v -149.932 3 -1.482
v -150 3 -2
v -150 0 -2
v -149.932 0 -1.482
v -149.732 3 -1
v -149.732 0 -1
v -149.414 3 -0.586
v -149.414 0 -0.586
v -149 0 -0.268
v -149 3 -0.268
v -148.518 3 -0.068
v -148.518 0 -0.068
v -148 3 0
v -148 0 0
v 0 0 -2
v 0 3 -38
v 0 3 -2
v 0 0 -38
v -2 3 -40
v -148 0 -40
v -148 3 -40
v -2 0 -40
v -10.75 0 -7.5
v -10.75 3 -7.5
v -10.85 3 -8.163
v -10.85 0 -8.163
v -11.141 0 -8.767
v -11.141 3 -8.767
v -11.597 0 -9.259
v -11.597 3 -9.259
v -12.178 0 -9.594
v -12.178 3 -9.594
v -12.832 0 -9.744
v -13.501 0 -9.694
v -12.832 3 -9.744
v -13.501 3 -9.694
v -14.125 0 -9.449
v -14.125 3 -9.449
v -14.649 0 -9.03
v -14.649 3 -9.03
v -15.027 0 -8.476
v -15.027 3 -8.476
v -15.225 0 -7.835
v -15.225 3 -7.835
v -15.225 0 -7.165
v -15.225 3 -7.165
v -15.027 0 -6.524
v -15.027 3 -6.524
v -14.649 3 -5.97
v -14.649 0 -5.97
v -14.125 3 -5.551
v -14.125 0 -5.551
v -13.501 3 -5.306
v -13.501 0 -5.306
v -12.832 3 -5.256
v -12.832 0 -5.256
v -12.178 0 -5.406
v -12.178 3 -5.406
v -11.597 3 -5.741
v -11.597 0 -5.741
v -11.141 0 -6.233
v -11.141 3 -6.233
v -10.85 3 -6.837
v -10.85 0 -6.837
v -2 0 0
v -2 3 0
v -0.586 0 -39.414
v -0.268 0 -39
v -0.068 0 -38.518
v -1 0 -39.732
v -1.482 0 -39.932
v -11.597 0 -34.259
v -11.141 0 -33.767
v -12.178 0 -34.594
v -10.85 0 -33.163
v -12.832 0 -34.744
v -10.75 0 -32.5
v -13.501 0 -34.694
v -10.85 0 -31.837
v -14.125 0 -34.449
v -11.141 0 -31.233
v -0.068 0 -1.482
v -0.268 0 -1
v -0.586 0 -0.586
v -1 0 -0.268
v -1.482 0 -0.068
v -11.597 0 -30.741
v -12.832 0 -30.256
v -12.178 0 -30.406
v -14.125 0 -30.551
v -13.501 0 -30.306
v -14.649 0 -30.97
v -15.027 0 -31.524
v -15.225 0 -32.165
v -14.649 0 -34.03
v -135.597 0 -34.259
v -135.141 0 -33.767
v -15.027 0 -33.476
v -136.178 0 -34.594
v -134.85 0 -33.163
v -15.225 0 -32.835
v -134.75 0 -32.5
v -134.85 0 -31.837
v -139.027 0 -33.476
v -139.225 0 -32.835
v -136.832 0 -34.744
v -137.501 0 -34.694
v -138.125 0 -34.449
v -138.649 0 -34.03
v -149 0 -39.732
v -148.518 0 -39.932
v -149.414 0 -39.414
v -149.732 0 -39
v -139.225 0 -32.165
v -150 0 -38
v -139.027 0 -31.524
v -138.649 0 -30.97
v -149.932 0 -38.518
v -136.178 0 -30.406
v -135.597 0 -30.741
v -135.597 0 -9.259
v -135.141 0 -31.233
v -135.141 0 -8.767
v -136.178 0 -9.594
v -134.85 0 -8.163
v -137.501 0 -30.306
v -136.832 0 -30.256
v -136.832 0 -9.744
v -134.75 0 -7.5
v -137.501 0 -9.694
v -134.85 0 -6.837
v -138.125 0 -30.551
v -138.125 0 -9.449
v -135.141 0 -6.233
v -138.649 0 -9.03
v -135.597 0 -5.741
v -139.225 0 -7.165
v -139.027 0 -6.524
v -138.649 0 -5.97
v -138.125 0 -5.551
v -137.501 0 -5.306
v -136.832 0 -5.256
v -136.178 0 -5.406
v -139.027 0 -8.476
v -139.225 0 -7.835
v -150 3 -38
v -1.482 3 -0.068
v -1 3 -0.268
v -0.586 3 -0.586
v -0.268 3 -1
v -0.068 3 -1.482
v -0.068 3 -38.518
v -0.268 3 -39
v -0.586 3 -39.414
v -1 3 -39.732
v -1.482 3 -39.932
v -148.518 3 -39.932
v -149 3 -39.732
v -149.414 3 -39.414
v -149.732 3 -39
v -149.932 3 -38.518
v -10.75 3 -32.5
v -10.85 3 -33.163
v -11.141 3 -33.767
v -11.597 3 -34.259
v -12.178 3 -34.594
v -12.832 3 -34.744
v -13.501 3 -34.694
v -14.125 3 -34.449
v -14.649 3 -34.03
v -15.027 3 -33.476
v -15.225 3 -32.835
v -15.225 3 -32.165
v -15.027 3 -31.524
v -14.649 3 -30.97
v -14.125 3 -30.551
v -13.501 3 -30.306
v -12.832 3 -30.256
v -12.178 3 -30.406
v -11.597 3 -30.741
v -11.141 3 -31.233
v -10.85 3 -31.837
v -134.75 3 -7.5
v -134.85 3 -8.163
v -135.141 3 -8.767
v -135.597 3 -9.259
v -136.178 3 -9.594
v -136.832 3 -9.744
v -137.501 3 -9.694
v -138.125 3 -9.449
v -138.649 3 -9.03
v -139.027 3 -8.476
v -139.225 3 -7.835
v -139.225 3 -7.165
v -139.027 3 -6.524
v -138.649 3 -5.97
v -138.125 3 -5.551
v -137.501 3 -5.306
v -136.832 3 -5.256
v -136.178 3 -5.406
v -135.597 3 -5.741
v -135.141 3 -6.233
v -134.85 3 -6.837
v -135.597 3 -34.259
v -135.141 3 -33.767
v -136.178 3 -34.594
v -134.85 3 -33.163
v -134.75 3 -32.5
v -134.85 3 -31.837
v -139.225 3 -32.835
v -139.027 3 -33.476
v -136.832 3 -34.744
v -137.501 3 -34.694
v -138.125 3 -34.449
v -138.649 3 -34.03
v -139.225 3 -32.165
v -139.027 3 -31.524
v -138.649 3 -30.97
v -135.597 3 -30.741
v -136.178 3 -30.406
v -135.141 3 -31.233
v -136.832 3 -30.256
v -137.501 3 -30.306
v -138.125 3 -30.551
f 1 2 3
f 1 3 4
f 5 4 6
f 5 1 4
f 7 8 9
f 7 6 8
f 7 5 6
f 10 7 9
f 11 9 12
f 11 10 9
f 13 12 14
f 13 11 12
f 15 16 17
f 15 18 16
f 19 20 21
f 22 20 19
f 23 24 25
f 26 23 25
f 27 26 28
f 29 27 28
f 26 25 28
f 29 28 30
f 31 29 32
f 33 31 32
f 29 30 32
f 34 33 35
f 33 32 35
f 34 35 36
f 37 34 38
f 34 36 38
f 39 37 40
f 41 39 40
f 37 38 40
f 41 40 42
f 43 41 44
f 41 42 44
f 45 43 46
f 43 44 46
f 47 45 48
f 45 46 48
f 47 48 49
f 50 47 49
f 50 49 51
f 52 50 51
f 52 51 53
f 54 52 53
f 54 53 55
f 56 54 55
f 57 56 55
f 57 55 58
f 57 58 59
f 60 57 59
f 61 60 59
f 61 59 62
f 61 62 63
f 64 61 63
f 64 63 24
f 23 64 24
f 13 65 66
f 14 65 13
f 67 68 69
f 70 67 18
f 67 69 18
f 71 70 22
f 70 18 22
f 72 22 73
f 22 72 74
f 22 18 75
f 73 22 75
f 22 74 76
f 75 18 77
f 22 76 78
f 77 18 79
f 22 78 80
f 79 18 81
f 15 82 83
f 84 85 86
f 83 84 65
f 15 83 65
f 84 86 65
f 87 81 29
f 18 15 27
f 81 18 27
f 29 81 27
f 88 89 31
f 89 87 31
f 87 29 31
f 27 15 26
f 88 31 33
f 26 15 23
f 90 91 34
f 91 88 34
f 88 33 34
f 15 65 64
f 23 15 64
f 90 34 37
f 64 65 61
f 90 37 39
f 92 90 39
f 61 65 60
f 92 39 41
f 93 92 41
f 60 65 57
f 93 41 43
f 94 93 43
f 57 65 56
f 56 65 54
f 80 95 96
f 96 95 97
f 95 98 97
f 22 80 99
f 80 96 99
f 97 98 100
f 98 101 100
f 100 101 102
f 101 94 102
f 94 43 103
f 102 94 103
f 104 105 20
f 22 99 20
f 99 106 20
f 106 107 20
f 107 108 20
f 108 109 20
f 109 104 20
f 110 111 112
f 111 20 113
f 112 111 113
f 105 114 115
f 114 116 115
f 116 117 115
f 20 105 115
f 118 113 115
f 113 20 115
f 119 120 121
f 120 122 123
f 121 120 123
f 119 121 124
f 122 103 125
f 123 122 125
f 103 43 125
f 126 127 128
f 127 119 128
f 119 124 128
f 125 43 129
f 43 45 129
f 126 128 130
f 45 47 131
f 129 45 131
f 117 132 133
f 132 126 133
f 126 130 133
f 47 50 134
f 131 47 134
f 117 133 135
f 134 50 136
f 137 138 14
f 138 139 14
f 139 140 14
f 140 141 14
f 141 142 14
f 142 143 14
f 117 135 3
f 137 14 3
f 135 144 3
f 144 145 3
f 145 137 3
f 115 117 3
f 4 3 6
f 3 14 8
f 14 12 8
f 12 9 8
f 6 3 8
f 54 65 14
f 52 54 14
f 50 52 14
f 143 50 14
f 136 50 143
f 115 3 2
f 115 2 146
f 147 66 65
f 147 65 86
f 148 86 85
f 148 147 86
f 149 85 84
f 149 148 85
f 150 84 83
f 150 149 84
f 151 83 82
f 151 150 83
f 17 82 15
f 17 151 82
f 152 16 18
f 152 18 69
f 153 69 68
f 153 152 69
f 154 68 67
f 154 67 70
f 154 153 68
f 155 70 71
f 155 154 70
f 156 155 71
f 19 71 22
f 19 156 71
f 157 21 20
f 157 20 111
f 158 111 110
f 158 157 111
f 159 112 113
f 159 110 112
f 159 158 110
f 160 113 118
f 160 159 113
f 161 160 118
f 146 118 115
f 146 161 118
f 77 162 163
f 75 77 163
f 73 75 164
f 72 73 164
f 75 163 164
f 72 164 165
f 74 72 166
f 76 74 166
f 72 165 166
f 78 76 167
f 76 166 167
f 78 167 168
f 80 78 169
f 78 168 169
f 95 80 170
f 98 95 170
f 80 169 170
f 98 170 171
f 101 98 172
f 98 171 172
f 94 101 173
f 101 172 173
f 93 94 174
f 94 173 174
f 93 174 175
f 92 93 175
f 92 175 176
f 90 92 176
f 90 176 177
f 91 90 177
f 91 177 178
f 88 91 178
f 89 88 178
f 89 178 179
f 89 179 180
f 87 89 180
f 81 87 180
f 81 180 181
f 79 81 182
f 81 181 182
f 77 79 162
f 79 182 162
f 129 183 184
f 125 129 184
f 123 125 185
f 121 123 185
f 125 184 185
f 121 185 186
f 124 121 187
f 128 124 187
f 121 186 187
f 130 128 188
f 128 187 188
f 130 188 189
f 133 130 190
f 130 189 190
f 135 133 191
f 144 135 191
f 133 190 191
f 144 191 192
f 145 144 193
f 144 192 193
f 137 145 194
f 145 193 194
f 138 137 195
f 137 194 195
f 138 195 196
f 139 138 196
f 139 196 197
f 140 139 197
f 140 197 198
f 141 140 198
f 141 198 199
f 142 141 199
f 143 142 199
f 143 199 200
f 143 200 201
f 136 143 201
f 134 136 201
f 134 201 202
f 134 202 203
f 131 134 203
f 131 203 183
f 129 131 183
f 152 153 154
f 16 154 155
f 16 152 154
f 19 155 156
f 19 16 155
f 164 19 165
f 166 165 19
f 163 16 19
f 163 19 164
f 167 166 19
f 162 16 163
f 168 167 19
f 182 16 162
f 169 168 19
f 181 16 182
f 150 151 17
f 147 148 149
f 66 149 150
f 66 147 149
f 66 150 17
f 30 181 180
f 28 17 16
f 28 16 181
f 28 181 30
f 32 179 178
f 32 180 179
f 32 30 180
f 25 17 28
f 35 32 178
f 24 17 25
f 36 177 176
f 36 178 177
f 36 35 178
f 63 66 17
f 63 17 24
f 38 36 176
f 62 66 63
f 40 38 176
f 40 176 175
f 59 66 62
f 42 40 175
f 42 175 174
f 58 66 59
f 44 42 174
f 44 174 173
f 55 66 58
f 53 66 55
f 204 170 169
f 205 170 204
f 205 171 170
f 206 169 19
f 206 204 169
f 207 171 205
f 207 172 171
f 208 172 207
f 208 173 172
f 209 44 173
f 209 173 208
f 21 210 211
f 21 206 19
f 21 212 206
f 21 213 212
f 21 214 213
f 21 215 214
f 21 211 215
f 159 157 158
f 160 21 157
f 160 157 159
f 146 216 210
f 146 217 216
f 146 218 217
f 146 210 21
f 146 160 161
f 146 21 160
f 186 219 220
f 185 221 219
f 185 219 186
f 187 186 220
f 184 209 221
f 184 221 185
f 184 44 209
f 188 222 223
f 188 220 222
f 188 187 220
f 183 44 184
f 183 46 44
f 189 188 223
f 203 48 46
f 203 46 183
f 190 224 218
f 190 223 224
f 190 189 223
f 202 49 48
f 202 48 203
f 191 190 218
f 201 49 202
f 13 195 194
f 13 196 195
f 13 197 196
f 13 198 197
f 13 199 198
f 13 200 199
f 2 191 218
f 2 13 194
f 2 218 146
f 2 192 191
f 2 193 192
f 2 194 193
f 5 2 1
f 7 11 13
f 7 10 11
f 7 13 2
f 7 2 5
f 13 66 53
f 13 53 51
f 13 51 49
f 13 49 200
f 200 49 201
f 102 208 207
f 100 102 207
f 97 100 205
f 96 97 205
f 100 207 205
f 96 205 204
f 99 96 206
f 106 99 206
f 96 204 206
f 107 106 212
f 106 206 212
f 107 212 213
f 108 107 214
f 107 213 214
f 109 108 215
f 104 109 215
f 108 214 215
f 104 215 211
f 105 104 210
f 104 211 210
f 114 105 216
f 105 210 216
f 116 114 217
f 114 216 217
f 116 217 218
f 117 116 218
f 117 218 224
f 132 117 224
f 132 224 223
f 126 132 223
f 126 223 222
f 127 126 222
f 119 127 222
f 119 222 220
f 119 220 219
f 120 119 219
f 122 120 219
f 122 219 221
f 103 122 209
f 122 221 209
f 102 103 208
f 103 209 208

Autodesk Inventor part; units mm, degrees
ref_plane "YZ Plane" through (0, 0, 0) normal (1, 0, 0) x (0, 1, 0)
ref_plane "XZ Plane" through (0, 0, 0) normal (0, 1, 0) x (-1, 0, 0)
ref_plane "XY Plane" through (0, 0, 0) normal (0, 0, 1) x (1, 0, 0)
sketch "Skizze1" plane through (0, 0, 0) normal (0, 1, 0) x (-1, 0, 0)
  line L0 (0, 0) -> (150, 0)
  line L1 (150, 0) -> (150, -40)
  line L2 (150, -40) -> (0, -40)
  line L3 (0, -40) -> (0, 0)
  dimension "d0" = 40
  dimension "d1" = 150
extrude "Extrusion1" add sketch "Skizze1" along normal blind 3
sketch "Skizze2" plane through (0, 3, 0) normal (0, 1, 0) x (1, 0, 0)
  line L0 (-150, 0) -> (0, 0) projected
  line L1 (-75, 0) -> (-75, 40)
  line L2 (0, 40) -> (-150, 40) projected
  line L3 (-150, 40) -> (-150, 0) projected
  line L4 (-150, 20) -> (0, 20)
  line L5 (0, 0) -> (0, 40) projected
  line L6 (-13, 0) -> (-13, 40) construction
  circle A0 centre (-13, 7.5) radius 2.25
  circle A1 centre (-13, 32.5) radius 2.25
  circle A2 centre (-137, 7.5) radius 2.25
  circle A3 centre (-137, 32.5) radius 2.25
  dimension "d4" = 13
  dimension "d5" = 4.5
  dimension "d6" = 4.5
  dimension "d7" = 25
extrude "Extrusion2" cut sketch "Skizze2" against normal blind 3 contours A0 | A1 | A2 | A3
fillet "Rundung1" radius 2 4 edges at (-150, 1.5, 0) (-150, 1.5, -40) (0, 1.5, -40) (0, 1.5, 0)
properties part number "Stabilisator_05" material "PET-Kunststoff"
